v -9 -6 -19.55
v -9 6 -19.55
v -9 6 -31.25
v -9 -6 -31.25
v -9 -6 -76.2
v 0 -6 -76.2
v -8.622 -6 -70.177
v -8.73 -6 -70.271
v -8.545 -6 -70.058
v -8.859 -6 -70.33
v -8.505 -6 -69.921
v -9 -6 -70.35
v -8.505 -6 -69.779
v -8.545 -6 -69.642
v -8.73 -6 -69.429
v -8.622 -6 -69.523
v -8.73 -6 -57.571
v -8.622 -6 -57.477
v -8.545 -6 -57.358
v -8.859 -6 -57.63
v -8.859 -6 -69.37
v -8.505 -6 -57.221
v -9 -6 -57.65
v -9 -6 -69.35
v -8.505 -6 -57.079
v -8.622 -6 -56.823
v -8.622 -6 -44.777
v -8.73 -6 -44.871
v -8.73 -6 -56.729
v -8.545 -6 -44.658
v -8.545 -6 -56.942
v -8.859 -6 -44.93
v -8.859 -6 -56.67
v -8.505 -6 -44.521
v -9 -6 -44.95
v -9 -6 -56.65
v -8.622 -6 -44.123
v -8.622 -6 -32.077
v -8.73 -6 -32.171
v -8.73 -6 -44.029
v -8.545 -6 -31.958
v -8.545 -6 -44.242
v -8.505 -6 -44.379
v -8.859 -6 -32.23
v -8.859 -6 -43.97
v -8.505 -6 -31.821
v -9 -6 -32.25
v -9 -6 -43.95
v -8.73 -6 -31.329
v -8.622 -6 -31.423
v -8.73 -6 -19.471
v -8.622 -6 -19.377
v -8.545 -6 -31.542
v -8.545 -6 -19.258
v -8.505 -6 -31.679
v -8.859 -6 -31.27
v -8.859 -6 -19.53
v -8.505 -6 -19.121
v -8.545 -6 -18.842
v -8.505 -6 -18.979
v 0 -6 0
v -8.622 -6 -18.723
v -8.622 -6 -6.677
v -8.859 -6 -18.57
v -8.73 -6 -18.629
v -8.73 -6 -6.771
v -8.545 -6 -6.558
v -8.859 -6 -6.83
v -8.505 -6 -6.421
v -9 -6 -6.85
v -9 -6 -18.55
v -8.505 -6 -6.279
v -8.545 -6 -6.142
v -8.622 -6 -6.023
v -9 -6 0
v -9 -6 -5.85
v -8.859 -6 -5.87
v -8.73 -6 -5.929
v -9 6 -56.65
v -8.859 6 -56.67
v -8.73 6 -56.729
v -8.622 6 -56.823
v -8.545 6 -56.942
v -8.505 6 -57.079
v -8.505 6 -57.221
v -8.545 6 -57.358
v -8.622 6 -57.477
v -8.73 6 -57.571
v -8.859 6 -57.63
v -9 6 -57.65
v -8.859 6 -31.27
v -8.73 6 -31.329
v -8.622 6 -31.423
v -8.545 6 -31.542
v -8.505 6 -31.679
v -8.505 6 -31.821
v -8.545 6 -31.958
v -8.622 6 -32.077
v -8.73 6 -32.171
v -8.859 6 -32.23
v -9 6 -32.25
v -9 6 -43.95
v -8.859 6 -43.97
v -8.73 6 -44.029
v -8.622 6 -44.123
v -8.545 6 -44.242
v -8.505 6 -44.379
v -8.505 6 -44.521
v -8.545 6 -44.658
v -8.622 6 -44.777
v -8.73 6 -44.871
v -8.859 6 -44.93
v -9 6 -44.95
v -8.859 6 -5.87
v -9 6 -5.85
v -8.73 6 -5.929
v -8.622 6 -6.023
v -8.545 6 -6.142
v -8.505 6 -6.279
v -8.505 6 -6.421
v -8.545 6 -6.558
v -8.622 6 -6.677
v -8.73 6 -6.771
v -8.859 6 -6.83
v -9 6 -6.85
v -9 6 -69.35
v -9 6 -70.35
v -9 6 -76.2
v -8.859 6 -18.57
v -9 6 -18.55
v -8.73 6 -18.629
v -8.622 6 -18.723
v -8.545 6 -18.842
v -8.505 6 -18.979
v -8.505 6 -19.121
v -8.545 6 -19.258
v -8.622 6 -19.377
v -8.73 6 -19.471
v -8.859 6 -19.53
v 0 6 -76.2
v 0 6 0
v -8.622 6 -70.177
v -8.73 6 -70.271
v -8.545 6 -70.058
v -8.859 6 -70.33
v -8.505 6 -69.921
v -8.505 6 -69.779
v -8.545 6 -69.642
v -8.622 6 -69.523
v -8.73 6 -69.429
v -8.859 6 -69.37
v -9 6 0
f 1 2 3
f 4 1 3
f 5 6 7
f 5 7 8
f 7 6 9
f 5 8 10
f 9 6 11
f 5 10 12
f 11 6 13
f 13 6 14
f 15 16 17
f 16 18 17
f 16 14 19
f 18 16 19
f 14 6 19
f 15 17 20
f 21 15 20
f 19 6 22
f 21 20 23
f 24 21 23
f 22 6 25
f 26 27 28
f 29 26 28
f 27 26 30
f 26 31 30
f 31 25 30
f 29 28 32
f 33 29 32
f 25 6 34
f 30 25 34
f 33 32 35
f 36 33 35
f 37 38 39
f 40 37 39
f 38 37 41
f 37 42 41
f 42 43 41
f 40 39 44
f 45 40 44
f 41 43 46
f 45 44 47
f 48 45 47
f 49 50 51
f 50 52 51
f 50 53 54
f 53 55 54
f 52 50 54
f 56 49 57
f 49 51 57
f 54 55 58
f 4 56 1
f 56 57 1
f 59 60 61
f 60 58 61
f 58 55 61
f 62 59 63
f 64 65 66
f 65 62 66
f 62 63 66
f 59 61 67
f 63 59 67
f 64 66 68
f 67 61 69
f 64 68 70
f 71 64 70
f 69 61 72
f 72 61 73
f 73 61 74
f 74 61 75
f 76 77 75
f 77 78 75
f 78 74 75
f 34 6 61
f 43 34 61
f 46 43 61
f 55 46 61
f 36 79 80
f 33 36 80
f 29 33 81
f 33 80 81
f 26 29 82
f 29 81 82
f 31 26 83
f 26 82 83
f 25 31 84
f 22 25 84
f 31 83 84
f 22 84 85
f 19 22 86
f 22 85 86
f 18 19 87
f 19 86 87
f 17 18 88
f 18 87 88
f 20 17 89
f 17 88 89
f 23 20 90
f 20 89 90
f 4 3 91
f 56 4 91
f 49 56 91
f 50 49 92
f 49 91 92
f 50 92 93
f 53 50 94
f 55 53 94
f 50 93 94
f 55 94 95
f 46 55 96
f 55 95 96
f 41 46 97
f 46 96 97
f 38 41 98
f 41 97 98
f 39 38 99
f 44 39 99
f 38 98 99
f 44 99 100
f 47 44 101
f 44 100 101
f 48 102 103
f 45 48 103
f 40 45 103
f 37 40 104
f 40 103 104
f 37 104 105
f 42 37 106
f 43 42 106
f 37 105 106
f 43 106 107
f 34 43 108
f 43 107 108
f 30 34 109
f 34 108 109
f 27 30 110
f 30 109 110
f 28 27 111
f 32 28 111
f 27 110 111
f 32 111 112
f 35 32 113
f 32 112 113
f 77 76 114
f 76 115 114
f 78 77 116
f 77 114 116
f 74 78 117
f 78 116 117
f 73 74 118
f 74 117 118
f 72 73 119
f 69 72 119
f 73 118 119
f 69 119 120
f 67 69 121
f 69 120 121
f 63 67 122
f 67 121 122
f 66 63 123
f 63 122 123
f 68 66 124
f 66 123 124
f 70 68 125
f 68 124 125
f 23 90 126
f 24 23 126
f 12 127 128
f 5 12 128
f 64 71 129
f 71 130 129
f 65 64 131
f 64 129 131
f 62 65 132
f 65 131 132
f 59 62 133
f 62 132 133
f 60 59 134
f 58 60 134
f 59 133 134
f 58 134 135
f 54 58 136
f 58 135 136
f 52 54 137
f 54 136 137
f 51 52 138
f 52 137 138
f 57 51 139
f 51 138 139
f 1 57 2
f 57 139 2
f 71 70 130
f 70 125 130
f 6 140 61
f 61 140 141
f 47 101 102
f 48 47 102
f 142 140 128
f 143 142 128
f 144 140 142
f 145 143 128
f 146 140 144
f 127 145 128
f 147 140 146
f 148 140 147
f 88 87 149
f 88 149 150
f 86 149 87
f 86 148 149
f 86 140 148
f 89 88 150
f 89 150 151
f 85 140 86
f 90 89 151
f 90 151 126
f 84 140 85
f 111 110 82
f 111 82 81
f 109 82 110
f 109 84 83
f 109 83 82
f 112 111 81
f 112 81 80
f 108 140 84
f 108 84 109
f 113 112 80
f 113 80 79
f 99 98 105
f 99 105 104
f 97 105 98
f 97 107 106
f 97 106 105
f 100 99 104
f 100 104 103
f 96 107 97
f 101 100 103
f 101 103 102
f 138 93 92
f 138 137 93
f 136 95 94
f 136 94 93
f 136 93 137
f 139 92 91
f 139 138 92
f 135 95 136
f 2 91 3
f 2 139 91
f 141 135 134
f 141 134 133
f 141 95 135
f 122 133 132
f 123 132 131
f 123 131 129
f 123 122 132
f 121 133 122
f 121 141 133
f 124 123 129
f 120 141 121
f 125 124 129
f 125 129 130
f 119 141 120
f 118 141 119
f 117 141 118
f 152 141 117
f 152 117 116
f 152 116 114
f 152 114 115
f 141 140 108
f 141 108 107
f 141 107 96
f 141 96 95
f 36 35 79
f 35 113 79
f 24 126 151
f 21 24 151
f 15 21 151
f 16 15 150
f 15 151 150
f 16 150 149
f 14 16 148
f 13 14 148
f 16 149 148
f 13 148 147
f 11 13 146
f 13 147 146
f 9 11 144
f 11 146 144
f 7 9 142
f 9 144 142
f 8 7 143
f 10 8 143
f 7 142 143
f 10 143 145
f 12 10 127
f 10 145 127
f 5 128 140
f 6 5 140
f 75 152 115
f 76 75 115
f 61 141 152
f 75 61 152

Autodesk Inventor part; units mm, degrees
ref_plane "YZ Plane" through (0, 0, 0) normal (1, 0, 0) x (0, 1, 0)
ref_plane "XZ Plane" through (0, 0, 0) normal (0, 1, 0) x (-1, 0, 0)
ref_plane "XY Plane" through (0, 0, 0) normal (0, 0, 1) x (1, 0, 0)
sketch "Sketch1" plane through (0, 0, 0) normal (0, 1, 0) x (-1, 0, 0)
  line L0 (0, 0) -> (9, 0)
  line L1 (9, 0) -> (9, -76.2)
  line L2 (9, -76.2) -> (0, -76.2)
  line L3 (0, -76.2) -> (0, 0)
  dimension "d0" = 76.2
  dimension "d1" = 9
extrude "Extrusion1" add sketch "Sketch1" against normal blind 6
extrude "Extrusion2" add sketch "Sketch1" along normal blind 6
sketch "Sketch2" plane through (0, 6, 0) normal (0, 1, 0) x (1, 0, 0)
  line L0 (-9, 0) -> (-9, 76.2) projected
  line L1 (0, 76.2) -> (0, 0) projected
  circle A0 centre (-9, 31.75) radius 0.5
  circle A1 centre (-9, 6.35) radius 0.5
  circle A2 centre (-9, 19.05) radius 0.5
  circle A3 centre (-9, 44.45) radius 0.5
  circle A4 centre (-9, 57.15) radius 0.5
  circle A5 centre (-9, 69.85) radius 0.5
  line L2 (-9, 76.2) -> (-9, 0) projected
  line L3 (-9, 0) -> (0, 0) projected
  dimension "d6" = 6.35
  dimension "d7" = 12.7
  dimension "d8" = 1
  dimension "d9" = 12.7
  dimension "d10" = 12.7
  dimension "d11" = 12.7
  dimension "d12" = 12.7
extrude "Extrusion3" cut sketch "Sketch2" against normal up to surface (12 mm away)
equation "\"d0\" = nutLength"
equation "\"d1\" = nutWidth"
equation "\"d2\" = nutHeight"
equation "\"d4\" = nutHeight"
equation "\"d6\" = sideOffset"
equation "\"d7\" = holeOffset"
equation "\"d8\" = holeDiameter"
equation "\"d9\" = holeOffset"
equation "\"d10\" = holeOffset"
equation "\"d11\" = holeOffset"
equation "\"d12\" = holeOffset"
equation "\"d13\" = nutHeight"
equation "\"nutLength\" = 76.2"
equation "\"nutWidth\" = 9"
equation "\"nutHeight\" = 6"
equation "\"holeOffset\" = -0.4 * sideOffset + 0.2 * nutLength"
equation "\"sideOffset\" = 6.35"
equation "\"holeDiameter\" = 1"
properties part number "Nut"
